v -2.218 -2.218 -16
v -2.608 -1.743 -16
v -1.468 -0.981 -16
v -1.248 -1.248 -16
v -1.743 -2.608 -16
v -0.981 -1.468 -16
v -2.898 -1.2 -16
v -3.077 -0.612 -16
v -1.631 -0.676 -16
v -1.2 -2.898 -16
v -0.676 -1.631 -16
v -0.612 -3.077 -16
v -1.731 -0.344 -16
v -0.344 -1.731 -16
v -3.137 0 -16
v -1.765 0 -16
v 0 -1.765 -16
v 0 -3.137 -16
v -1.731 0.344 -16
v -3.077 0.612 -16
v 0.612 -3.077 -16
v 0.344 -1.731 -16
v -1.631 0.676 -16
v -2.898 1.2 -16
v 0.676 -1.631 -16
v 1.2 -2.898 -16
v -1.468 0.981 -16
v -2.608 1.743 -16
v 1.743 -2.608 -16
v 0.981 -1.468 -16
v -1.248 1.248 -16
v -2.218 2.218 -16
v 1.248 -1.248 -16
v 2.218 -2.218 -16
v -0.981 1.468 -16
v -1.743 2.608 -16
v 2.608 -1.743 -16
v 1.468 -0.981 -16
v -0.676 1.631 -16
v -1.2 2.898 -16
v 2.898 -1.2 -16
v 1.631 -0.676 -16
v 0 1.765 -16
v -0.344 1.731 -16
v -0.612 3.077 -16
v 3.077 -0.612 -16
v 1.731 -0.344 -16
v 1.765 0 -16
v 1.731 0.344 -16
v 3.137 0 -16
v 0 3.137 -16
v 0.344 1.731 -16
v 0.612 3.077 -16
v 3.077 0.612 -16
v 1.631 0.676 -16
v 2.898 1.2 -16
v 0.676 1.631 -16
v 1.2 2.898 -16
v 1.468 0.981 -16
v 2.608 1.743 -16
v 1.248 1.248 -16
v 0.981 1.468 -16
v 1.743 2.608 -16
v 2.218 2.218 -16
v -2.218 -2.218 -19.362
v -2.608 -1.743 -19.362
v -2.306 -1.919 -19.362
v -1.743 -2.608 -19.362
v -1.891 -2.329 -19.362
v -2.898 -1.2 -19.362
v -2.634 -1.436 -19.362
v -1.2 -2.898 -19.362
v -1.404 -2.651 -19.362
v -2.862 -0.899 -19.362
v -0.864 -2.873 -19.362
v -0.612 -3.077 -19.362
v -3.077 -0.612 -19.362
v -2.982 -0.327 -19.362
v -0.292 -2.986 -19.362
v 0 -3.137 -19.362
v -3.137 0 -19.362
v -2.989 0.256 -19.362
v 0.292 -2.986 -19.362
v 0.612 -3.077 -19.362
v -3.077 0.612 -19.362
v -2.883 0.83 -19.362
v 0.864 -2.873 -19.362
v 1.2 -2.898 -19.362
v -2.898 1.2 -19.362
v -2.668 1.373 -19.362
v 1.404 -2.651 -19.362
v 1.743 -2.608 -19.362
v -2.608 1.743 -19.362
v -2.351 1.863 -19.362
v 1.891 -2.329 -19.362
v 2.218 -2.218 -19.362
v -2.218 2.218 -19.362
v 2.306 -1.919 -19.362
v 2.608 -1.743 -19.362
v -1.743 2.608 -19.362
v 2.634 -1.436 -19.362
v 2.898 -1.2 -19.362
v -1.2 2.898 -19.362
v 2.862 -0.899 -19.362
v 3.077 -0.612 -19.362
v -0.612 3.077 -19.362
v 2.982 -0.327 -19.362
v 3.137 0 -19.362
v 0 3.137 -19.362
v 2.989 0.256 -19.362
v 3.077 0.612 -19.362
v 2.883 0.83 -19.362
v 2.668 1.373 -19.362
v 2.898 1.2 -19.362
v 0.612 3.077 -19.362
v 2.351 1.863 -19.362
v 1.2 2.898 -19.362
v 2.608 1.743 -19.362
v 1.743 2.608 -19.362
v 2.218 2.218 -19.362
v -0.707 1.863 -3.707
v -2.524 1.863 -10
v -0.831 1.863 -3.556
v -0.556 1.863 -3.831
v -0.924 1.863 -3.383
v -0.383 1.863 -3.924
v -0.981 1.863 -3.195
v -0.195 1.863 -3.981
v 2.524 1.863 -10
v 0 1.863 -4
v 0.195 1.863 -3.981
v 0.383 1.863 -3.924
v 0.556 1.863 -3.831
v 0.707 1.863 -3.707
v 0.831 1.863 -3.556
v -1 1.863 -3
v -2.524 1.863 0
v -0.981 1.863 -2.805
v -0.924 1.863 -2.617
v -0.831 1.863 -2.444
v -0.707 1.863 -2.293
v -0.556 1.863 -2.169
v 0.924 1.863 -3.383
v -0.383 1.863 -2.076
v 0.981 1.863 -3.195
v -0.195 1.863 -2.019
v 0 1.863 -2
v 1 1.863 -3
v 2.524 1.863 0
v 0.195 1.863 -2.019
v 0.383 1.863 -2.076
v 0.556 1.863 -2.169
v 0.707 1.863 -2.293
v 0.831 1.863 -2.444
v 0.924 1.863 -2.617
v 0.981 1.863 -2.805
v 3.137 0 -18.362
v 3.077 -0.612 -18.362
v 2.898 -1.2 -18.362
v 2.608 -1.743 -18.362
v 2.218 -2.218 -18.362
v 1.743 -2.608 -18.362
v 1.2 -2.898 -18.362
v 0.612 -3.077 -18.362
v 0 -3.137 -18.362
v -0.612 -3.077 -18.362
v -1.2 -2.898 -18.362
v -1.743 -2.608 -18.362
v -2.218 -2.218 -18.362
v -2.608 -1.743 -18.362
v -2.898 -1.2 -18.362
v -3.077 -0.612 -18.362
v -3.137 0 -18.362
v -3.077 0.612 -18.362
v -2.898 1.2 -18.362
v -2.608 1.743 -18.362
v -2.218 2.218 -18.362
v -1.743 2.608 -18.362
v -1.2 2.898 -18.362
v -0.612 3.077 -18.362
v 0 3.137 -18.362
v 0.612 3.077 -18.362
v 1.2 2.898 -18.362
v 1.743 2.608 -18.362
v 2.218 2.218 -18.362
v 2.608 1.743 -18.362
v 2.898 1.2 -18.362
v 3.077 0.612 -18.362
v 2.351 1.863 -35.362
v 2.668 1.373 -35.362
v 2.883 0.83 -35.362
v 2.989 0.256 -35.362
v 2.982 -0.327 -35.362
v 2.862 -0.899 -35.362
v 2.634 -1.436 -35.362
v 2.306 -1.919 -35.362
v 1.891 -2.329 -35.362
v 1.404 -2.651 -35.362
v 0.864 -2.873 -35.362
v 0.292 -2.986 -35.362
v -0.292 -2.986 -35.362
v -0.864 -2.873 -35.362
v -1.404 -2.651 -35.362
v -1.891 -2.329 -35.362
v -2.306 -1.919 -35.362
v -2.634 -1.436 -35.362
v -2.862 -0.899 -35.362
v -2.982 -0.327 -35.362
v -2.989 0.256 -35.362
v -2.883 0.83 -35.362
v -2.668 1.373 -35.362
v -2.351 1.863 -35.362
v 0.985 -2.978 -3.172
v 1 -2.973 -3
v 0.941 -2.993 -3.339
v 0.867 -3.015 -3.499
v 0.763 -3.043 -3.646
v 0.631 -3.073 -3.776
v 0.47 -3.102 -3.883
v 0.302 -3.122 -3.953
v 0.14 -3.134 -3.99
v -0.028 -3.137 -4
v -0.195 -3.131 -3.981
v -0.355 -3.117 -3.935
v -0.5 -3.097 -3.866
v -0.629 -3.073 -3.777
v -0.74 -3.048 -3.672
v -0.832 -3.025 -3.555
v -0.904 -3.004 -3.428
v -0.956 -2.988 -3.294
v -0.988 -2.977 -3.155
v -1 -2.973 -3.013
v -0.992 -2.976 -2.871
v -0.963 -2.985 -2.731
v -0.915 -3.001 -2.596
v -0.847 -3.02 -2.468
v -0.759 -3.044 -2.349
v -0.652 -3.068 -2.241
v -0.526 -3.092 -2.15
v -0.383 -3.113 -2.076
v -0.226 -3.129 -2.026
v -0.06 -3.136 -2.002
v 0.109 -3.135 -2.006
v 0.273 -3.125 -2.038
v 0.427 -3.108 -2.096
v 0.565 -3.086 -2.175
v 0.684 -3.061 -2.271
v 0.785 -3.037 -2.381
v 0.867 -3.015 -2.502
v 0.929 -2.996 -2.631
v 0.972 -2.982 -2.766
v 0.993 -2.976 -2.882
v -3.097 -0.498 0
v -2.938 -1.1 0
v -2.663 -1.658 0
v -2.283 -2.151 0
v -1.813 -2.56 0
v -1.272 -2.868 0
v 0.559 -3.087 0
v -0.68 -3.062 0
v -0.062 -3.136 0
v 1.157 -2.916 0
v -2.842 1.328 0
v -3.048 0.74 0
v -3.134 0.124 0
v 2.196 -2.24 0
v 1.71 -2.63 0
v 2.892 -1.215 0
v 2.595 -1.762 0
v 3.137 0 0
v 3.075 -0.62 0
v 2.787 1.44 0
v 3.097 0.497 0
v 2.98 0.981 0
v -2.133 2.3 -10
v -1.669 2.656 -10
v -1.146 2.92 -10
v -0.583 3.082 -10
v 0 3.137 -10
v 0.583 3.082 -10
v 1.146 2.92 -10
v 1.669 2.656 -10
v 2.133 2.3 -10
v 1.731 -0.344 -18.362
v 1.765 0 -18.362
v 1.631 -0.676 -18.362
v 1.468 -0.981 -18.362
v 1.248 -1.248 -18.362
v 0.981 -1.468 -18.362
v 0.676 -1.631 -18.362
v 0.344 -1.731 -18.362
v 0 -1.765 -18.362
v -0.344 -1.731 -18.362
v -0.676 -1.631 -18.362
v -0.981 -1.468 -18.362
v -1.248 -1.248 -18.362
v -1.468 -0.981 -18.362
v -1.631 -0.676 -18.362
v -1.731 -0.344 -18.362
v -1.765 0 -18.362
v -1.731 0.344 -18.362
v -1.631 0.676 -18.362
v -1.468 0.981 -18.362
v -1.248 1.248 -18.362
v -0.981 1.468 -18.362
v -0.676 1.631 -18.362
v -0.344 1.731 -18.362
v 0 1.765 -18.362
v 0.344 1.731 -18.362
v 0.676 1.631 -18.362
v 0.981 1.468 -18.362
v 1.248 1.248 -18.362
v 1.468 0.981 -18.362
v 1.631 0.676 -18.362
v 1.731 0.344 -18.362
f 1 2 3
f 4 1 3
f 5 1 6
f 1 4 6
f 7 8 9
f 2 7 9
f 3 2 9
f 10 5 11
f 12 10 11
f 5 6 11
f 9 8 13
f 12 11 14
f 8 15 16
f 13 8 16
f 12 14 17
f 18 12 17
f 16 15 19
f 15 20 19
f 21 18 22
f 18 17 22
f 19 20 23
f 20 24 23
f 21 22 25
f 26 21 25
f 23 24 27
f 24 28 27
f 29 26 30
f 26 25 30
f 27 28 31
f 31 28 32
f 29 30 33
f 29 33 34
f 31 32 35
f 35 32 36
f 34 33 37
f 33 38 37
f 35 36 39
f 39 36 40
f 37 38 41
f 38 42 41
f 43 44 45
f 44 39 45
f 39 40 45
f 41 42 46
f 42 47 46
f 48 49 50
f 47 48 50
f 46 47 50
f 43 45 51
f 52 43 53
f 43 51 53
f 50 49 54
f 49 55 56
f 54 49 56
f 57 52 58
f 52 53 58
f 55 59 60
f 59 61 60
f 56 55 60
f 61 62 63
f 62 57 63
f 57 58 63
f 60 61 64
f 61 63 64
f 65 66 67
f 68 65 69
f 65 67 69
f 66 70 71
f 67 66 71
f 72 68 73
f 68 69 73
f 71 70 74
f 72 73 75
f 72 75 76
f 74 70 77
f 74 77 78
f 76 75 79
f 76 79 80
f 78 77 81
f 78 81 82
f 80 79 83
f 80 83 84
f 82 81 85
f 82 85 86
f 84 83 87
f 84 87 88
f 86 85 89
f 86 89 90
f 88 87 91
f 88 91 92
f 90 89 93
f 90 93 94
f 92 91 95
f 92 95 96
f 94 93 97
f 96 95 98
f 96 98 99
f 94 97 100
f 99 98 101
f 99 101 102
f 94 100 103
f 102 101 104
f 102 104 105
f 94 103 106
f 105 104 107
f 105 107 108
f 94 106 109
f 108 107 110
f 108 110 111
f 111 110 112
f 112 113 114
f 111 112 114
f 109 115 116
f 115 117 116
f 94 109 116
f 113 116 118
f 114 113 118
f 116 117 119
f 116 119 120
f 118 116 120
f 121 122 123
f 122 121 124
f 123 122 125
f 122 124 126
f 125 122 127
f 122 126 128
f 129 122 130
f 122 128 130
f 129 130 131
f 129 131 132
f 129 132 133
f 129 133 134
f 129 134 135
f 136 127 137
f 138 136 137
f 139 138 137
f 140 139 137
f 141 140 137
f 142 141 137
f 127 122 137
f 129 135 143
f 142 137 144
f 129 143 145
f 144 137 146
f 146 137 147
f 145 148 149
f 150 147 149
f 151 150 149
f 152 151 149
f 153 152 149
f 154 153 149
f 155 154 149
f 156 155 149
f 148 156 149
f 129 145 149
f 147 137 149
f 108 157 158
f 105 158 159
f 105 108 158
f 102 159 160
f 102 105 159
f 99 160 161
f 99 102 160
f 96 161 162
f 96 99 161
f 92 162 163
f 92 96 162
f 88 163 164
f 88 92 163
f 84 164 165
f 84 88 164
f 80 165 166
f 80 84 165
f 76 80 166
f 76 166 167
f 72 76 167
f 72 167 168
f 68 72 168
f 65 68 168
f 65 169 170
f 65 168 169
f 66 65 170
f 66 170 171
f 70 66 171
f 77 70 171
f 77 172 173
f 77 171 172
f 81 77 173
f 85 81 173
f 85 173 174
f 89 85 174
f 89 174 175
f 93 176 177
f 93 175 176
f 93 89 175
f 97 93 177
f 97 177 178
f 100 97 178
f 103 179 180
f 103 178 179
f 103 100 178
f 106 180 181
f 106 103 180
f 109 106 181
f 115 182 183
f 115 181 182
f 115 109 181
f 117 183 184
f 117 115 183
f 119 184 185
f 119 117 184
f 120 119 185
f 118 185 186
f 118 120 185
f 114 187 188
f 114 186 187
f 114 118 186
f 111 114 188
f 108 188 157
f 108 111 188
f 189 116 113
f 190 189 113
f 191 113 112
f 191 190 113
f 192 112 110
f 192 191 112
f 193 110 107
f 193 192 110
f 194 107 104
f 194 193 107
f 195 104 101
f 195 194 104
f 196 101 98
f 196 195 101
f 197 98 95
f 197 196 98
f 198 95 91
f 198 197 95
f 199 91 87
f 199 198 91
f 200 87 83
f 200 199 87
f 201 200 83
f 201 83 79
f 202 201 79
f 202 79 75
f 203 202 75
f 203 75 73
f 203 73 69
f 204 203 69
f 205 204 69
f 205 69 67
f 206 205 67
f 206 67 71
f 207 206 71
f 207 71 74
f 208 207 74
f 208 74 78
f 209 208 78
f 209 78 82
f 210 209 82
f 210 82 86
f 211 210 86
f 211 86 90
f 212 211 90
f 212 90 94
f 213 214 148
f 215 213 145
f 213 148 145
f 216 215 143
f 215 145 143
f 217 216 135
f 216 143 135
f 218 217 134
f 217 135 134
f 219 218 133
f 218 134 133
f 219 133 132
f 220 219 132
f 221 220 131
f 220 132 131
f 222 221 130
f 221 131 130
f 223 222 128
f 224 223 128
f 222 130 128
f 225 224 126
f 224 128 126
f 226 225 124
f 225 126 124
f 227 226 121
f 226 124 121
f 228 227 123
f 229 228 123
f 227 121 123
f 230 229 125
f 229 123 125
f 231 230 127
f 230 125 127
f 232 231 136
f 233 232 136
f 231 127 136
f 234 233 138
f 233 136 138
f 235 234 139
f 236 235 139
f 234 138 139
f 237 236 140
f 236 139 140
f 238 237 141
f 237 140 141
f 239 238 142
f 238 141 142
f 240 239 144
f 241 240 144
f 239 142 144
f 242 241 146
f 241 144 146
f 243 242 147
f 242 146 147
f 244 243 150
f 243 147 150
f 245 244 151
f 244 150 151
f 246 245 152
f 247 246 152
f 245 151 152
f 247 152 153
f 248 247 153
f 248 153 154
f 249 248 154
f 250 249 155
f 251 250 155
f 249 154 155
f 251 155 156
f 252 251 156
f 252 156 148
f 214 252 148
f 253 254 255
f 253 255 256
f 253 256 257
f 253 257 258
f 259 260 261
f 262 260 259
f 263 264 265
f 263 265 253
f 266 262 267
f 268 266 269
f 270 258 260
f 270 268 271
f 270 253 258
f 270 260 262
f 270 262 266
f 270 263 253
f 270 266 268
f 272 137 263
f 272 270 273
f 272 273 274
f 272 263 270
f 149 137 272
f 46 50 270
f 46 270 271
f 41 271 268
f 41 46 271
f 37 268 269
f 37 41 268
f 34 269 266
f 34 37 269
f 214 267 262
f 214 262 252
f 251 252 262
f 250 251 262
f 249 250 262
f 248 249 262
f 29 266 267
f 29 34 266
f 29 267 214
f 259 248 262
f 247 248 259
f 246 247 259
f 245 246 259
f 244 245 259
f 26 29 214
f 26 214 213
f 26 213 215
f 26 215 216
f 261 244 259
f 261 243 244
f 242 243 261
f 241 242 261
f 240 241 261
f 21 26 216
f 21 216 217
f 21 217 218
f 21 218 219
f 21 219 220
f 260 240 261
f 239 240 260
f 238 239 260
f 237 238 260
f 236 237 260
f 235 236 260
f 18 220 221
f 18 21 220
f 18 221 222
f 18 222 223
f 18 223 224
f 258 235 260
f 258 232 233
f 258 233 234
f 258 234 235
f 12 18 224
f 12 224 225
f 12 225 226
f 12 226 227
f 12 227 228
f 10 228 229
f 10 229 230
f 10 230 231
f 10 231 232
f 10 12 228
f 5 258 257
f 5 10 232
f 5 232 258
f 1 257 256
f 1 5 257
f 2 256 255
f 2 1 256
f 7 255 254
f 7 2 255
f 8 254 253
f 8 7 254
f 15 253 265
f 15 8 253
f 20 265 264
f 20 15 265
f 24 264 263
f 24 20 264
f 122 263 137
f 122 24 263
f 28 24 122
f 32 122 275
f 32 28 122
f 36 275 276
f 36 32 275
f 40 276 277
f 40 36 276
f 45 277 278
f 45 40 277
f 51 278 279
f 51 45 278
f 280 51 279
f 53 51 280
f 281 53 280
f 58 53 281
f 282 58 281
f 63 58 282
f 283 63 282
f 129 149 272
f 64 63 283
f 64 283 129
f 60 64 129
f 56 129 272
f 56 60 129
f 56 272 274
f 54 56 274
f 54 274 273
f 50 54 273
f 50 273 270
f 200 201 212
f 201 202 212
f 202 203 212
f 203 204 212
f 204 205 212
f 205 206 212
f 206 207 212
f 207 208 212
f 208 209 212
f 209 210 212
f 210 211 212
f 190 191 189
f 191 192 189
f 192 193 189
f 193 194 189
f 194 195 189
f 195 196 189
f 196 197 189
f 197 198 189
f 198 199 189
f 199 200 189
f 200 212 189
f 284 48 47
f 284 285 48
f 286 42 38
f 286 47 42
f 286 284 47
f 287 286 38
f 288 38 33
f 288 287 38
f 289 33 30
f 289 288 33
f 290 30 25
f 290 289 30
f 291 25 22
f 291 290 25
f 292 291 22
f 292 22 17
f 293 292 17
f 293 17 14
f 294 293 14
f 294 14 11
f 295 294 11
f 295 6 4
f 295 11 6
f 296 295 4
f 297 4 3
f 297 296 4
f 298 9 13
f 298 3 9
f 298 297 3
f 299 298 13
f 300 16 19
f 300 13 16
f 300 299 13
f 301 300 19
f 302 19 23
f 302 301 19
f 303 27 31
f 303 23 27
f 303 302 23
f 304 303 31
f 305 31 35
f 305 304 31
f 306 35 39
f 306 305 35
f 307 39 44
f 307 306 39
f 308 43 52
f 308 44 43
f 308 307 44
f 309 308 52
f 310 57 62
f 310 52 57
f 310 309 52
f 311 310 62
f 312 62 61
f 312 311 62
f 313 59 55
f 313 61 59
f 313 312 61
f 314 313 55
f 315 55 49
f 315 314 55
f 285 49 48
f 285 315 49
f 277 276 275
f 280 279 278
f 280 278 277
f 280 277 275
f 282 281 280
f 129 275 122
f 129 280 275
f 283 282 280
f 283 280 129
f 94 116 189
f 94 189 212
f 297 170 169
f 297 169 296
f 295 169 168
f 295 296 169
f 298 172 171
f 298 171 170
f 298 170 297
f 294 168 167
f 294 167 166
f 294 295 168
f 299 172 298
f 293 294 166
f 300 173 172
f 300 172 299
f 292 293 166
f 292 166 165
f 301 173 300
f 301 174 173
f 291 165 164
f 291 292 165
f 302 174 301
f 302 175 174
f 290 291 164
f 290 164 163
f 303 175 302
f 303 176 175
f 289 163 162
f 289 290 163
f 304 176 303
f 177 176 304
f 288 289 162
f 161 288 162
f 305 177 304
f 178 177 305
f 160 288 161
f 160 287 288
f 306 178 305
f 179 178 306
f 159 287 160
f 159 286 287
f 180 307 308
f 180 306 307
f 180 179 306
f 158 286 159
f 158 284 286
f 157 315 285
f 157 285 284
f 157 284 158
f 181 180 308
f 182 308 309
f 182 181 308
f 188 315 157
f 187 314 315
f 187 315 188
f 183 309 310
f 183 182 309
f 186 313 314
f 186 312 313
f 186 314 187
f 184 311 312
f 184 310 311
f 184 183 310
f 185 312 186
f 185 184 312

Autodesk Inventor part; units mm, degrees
ref_plane "YZ Plane" through (0, 0, 0) normal (1, 0, 0) x (0, 1, 0)
ref_plane "XZ Plane" through (0, 0, 0) normal (0, 1, 0) x (-1, 0, 0)
ref_plane "XY Plane" through (0, 0, 0) normal (0, 0, 1) x (1, 0, 0)
sketch "Sketch1" plane through (0, 0, 0) normal (0, 1, 0) x (-1, 0, 0)
  line L0 (0, 0) -> (-2, 0)
  line L1 (-2, 0) -> (-3.1369, 0)
  line L2 (-3.1369, 0) -> (-3.1369, -16)
  line L3 (-3.1369, -16) -> (-1.7653, -16)
  line L4 (-1.7653, -16) -> (-1.7653, -18.3622)
  line L5 (-1.7653, -18.3622) -> (-3.1369, -18.3622)
  line L6 (-3.1369, -18.3622) -> (-3.1369, -19.3622)
  line L7 (-2, 0) -> (0, 0)
  line L8 (-2, 0) -> (0, 0)
  line L9 (-3.1369, -19.3622) -> (-3, -19.3622)
  line L10 (-3, -19.3622) -> (-3, -35.3622)
  line L11 (-3, -35.3622) -> (0, -35.3622)
  line L12 (0, -35.3622) -> (0, 0)
  dimension "d1" = 0
  dimension "d2" = 16
  dimension "d3" = 2.3622
  dimension "d6" = 3.1369
  dimension "d8" = 3
  dimension "d13" = 1
  dimension "d29" = 1.7653
  dimension "d30" = 16
revolve "Revolution1" add sketch "Sketch1" angle 360 about axis through (0, 0, -35.3622) along (0, 0, 1)
thread "Thread1" size "M6x1" class "6g" standard "ANSI Metric M Profile" full length
sketch "Sketch3" plane through (0, 0, 0) normal (0, 0, 1) x (1, 0, 0)
  circle A0 centre (0, 0) radius 3.1369 projected
  line L0 (-2.4166, -2) -> (2.4166, -2)
  line L1 (-2.5237, 1.8631) -> (2.5237, 1.8631)
  arc A1 (2.4166, -2) -> (2.5237, 1.8631) centre (0, 0) ccw
  arc A2 (-2.5237, 1.8631) -> (-2.4166, -2) centre (0, 0) ccw
  point P0 (0, 0)
  dimension "d36" = 5
extrude "Extrusion1" cut sketch "Sketch3" against normal blind 10 contours L1 A0
sketch "Sketch4" plane through (-2.5237, 1.8631, 0) normal (0, 1, 0) x (1, 0, 0)
  circle A0 centre (2.5237, 3) radius 1
  point P0 (2.5237, 0)
  dimension "d23" = 2
  dimension "d24" = 3
extrude "Extrusion2" cut sketch "Sketch4" against normal blind 10
thread "Thread2" size "M2x0.4" class "6H" standard "ANSI Metric M Profile" full length
sketch "Sketch5" plane through (0, 0, -35.3622) normal (0, 0, -1) x (-1, 0, 0)
  circle A0 centre (0, 0) radius 3.1369 projected
  line L0 (-2.5237, 1.8631) -> (2.5258, 1.8631)
  line L1 (2.5258, 1.8631) -> (2.5258, 4.5959)
  line L2 (2.5258, 4.5959) -> (-2.5237, 4.5959)
  line L3 (-2.5237, 4.5959) -> (-2.5237, 1.8631)
  point P0 (0, 0)
  dimension "d33" = 5
extrude "Extrusion3" cut sketch "Sketch5" against normal blind 16 contours L0 A0 | A0 L3 L2 L1 picked at (-0.6375, 2.3533)
properties part number "rod"
